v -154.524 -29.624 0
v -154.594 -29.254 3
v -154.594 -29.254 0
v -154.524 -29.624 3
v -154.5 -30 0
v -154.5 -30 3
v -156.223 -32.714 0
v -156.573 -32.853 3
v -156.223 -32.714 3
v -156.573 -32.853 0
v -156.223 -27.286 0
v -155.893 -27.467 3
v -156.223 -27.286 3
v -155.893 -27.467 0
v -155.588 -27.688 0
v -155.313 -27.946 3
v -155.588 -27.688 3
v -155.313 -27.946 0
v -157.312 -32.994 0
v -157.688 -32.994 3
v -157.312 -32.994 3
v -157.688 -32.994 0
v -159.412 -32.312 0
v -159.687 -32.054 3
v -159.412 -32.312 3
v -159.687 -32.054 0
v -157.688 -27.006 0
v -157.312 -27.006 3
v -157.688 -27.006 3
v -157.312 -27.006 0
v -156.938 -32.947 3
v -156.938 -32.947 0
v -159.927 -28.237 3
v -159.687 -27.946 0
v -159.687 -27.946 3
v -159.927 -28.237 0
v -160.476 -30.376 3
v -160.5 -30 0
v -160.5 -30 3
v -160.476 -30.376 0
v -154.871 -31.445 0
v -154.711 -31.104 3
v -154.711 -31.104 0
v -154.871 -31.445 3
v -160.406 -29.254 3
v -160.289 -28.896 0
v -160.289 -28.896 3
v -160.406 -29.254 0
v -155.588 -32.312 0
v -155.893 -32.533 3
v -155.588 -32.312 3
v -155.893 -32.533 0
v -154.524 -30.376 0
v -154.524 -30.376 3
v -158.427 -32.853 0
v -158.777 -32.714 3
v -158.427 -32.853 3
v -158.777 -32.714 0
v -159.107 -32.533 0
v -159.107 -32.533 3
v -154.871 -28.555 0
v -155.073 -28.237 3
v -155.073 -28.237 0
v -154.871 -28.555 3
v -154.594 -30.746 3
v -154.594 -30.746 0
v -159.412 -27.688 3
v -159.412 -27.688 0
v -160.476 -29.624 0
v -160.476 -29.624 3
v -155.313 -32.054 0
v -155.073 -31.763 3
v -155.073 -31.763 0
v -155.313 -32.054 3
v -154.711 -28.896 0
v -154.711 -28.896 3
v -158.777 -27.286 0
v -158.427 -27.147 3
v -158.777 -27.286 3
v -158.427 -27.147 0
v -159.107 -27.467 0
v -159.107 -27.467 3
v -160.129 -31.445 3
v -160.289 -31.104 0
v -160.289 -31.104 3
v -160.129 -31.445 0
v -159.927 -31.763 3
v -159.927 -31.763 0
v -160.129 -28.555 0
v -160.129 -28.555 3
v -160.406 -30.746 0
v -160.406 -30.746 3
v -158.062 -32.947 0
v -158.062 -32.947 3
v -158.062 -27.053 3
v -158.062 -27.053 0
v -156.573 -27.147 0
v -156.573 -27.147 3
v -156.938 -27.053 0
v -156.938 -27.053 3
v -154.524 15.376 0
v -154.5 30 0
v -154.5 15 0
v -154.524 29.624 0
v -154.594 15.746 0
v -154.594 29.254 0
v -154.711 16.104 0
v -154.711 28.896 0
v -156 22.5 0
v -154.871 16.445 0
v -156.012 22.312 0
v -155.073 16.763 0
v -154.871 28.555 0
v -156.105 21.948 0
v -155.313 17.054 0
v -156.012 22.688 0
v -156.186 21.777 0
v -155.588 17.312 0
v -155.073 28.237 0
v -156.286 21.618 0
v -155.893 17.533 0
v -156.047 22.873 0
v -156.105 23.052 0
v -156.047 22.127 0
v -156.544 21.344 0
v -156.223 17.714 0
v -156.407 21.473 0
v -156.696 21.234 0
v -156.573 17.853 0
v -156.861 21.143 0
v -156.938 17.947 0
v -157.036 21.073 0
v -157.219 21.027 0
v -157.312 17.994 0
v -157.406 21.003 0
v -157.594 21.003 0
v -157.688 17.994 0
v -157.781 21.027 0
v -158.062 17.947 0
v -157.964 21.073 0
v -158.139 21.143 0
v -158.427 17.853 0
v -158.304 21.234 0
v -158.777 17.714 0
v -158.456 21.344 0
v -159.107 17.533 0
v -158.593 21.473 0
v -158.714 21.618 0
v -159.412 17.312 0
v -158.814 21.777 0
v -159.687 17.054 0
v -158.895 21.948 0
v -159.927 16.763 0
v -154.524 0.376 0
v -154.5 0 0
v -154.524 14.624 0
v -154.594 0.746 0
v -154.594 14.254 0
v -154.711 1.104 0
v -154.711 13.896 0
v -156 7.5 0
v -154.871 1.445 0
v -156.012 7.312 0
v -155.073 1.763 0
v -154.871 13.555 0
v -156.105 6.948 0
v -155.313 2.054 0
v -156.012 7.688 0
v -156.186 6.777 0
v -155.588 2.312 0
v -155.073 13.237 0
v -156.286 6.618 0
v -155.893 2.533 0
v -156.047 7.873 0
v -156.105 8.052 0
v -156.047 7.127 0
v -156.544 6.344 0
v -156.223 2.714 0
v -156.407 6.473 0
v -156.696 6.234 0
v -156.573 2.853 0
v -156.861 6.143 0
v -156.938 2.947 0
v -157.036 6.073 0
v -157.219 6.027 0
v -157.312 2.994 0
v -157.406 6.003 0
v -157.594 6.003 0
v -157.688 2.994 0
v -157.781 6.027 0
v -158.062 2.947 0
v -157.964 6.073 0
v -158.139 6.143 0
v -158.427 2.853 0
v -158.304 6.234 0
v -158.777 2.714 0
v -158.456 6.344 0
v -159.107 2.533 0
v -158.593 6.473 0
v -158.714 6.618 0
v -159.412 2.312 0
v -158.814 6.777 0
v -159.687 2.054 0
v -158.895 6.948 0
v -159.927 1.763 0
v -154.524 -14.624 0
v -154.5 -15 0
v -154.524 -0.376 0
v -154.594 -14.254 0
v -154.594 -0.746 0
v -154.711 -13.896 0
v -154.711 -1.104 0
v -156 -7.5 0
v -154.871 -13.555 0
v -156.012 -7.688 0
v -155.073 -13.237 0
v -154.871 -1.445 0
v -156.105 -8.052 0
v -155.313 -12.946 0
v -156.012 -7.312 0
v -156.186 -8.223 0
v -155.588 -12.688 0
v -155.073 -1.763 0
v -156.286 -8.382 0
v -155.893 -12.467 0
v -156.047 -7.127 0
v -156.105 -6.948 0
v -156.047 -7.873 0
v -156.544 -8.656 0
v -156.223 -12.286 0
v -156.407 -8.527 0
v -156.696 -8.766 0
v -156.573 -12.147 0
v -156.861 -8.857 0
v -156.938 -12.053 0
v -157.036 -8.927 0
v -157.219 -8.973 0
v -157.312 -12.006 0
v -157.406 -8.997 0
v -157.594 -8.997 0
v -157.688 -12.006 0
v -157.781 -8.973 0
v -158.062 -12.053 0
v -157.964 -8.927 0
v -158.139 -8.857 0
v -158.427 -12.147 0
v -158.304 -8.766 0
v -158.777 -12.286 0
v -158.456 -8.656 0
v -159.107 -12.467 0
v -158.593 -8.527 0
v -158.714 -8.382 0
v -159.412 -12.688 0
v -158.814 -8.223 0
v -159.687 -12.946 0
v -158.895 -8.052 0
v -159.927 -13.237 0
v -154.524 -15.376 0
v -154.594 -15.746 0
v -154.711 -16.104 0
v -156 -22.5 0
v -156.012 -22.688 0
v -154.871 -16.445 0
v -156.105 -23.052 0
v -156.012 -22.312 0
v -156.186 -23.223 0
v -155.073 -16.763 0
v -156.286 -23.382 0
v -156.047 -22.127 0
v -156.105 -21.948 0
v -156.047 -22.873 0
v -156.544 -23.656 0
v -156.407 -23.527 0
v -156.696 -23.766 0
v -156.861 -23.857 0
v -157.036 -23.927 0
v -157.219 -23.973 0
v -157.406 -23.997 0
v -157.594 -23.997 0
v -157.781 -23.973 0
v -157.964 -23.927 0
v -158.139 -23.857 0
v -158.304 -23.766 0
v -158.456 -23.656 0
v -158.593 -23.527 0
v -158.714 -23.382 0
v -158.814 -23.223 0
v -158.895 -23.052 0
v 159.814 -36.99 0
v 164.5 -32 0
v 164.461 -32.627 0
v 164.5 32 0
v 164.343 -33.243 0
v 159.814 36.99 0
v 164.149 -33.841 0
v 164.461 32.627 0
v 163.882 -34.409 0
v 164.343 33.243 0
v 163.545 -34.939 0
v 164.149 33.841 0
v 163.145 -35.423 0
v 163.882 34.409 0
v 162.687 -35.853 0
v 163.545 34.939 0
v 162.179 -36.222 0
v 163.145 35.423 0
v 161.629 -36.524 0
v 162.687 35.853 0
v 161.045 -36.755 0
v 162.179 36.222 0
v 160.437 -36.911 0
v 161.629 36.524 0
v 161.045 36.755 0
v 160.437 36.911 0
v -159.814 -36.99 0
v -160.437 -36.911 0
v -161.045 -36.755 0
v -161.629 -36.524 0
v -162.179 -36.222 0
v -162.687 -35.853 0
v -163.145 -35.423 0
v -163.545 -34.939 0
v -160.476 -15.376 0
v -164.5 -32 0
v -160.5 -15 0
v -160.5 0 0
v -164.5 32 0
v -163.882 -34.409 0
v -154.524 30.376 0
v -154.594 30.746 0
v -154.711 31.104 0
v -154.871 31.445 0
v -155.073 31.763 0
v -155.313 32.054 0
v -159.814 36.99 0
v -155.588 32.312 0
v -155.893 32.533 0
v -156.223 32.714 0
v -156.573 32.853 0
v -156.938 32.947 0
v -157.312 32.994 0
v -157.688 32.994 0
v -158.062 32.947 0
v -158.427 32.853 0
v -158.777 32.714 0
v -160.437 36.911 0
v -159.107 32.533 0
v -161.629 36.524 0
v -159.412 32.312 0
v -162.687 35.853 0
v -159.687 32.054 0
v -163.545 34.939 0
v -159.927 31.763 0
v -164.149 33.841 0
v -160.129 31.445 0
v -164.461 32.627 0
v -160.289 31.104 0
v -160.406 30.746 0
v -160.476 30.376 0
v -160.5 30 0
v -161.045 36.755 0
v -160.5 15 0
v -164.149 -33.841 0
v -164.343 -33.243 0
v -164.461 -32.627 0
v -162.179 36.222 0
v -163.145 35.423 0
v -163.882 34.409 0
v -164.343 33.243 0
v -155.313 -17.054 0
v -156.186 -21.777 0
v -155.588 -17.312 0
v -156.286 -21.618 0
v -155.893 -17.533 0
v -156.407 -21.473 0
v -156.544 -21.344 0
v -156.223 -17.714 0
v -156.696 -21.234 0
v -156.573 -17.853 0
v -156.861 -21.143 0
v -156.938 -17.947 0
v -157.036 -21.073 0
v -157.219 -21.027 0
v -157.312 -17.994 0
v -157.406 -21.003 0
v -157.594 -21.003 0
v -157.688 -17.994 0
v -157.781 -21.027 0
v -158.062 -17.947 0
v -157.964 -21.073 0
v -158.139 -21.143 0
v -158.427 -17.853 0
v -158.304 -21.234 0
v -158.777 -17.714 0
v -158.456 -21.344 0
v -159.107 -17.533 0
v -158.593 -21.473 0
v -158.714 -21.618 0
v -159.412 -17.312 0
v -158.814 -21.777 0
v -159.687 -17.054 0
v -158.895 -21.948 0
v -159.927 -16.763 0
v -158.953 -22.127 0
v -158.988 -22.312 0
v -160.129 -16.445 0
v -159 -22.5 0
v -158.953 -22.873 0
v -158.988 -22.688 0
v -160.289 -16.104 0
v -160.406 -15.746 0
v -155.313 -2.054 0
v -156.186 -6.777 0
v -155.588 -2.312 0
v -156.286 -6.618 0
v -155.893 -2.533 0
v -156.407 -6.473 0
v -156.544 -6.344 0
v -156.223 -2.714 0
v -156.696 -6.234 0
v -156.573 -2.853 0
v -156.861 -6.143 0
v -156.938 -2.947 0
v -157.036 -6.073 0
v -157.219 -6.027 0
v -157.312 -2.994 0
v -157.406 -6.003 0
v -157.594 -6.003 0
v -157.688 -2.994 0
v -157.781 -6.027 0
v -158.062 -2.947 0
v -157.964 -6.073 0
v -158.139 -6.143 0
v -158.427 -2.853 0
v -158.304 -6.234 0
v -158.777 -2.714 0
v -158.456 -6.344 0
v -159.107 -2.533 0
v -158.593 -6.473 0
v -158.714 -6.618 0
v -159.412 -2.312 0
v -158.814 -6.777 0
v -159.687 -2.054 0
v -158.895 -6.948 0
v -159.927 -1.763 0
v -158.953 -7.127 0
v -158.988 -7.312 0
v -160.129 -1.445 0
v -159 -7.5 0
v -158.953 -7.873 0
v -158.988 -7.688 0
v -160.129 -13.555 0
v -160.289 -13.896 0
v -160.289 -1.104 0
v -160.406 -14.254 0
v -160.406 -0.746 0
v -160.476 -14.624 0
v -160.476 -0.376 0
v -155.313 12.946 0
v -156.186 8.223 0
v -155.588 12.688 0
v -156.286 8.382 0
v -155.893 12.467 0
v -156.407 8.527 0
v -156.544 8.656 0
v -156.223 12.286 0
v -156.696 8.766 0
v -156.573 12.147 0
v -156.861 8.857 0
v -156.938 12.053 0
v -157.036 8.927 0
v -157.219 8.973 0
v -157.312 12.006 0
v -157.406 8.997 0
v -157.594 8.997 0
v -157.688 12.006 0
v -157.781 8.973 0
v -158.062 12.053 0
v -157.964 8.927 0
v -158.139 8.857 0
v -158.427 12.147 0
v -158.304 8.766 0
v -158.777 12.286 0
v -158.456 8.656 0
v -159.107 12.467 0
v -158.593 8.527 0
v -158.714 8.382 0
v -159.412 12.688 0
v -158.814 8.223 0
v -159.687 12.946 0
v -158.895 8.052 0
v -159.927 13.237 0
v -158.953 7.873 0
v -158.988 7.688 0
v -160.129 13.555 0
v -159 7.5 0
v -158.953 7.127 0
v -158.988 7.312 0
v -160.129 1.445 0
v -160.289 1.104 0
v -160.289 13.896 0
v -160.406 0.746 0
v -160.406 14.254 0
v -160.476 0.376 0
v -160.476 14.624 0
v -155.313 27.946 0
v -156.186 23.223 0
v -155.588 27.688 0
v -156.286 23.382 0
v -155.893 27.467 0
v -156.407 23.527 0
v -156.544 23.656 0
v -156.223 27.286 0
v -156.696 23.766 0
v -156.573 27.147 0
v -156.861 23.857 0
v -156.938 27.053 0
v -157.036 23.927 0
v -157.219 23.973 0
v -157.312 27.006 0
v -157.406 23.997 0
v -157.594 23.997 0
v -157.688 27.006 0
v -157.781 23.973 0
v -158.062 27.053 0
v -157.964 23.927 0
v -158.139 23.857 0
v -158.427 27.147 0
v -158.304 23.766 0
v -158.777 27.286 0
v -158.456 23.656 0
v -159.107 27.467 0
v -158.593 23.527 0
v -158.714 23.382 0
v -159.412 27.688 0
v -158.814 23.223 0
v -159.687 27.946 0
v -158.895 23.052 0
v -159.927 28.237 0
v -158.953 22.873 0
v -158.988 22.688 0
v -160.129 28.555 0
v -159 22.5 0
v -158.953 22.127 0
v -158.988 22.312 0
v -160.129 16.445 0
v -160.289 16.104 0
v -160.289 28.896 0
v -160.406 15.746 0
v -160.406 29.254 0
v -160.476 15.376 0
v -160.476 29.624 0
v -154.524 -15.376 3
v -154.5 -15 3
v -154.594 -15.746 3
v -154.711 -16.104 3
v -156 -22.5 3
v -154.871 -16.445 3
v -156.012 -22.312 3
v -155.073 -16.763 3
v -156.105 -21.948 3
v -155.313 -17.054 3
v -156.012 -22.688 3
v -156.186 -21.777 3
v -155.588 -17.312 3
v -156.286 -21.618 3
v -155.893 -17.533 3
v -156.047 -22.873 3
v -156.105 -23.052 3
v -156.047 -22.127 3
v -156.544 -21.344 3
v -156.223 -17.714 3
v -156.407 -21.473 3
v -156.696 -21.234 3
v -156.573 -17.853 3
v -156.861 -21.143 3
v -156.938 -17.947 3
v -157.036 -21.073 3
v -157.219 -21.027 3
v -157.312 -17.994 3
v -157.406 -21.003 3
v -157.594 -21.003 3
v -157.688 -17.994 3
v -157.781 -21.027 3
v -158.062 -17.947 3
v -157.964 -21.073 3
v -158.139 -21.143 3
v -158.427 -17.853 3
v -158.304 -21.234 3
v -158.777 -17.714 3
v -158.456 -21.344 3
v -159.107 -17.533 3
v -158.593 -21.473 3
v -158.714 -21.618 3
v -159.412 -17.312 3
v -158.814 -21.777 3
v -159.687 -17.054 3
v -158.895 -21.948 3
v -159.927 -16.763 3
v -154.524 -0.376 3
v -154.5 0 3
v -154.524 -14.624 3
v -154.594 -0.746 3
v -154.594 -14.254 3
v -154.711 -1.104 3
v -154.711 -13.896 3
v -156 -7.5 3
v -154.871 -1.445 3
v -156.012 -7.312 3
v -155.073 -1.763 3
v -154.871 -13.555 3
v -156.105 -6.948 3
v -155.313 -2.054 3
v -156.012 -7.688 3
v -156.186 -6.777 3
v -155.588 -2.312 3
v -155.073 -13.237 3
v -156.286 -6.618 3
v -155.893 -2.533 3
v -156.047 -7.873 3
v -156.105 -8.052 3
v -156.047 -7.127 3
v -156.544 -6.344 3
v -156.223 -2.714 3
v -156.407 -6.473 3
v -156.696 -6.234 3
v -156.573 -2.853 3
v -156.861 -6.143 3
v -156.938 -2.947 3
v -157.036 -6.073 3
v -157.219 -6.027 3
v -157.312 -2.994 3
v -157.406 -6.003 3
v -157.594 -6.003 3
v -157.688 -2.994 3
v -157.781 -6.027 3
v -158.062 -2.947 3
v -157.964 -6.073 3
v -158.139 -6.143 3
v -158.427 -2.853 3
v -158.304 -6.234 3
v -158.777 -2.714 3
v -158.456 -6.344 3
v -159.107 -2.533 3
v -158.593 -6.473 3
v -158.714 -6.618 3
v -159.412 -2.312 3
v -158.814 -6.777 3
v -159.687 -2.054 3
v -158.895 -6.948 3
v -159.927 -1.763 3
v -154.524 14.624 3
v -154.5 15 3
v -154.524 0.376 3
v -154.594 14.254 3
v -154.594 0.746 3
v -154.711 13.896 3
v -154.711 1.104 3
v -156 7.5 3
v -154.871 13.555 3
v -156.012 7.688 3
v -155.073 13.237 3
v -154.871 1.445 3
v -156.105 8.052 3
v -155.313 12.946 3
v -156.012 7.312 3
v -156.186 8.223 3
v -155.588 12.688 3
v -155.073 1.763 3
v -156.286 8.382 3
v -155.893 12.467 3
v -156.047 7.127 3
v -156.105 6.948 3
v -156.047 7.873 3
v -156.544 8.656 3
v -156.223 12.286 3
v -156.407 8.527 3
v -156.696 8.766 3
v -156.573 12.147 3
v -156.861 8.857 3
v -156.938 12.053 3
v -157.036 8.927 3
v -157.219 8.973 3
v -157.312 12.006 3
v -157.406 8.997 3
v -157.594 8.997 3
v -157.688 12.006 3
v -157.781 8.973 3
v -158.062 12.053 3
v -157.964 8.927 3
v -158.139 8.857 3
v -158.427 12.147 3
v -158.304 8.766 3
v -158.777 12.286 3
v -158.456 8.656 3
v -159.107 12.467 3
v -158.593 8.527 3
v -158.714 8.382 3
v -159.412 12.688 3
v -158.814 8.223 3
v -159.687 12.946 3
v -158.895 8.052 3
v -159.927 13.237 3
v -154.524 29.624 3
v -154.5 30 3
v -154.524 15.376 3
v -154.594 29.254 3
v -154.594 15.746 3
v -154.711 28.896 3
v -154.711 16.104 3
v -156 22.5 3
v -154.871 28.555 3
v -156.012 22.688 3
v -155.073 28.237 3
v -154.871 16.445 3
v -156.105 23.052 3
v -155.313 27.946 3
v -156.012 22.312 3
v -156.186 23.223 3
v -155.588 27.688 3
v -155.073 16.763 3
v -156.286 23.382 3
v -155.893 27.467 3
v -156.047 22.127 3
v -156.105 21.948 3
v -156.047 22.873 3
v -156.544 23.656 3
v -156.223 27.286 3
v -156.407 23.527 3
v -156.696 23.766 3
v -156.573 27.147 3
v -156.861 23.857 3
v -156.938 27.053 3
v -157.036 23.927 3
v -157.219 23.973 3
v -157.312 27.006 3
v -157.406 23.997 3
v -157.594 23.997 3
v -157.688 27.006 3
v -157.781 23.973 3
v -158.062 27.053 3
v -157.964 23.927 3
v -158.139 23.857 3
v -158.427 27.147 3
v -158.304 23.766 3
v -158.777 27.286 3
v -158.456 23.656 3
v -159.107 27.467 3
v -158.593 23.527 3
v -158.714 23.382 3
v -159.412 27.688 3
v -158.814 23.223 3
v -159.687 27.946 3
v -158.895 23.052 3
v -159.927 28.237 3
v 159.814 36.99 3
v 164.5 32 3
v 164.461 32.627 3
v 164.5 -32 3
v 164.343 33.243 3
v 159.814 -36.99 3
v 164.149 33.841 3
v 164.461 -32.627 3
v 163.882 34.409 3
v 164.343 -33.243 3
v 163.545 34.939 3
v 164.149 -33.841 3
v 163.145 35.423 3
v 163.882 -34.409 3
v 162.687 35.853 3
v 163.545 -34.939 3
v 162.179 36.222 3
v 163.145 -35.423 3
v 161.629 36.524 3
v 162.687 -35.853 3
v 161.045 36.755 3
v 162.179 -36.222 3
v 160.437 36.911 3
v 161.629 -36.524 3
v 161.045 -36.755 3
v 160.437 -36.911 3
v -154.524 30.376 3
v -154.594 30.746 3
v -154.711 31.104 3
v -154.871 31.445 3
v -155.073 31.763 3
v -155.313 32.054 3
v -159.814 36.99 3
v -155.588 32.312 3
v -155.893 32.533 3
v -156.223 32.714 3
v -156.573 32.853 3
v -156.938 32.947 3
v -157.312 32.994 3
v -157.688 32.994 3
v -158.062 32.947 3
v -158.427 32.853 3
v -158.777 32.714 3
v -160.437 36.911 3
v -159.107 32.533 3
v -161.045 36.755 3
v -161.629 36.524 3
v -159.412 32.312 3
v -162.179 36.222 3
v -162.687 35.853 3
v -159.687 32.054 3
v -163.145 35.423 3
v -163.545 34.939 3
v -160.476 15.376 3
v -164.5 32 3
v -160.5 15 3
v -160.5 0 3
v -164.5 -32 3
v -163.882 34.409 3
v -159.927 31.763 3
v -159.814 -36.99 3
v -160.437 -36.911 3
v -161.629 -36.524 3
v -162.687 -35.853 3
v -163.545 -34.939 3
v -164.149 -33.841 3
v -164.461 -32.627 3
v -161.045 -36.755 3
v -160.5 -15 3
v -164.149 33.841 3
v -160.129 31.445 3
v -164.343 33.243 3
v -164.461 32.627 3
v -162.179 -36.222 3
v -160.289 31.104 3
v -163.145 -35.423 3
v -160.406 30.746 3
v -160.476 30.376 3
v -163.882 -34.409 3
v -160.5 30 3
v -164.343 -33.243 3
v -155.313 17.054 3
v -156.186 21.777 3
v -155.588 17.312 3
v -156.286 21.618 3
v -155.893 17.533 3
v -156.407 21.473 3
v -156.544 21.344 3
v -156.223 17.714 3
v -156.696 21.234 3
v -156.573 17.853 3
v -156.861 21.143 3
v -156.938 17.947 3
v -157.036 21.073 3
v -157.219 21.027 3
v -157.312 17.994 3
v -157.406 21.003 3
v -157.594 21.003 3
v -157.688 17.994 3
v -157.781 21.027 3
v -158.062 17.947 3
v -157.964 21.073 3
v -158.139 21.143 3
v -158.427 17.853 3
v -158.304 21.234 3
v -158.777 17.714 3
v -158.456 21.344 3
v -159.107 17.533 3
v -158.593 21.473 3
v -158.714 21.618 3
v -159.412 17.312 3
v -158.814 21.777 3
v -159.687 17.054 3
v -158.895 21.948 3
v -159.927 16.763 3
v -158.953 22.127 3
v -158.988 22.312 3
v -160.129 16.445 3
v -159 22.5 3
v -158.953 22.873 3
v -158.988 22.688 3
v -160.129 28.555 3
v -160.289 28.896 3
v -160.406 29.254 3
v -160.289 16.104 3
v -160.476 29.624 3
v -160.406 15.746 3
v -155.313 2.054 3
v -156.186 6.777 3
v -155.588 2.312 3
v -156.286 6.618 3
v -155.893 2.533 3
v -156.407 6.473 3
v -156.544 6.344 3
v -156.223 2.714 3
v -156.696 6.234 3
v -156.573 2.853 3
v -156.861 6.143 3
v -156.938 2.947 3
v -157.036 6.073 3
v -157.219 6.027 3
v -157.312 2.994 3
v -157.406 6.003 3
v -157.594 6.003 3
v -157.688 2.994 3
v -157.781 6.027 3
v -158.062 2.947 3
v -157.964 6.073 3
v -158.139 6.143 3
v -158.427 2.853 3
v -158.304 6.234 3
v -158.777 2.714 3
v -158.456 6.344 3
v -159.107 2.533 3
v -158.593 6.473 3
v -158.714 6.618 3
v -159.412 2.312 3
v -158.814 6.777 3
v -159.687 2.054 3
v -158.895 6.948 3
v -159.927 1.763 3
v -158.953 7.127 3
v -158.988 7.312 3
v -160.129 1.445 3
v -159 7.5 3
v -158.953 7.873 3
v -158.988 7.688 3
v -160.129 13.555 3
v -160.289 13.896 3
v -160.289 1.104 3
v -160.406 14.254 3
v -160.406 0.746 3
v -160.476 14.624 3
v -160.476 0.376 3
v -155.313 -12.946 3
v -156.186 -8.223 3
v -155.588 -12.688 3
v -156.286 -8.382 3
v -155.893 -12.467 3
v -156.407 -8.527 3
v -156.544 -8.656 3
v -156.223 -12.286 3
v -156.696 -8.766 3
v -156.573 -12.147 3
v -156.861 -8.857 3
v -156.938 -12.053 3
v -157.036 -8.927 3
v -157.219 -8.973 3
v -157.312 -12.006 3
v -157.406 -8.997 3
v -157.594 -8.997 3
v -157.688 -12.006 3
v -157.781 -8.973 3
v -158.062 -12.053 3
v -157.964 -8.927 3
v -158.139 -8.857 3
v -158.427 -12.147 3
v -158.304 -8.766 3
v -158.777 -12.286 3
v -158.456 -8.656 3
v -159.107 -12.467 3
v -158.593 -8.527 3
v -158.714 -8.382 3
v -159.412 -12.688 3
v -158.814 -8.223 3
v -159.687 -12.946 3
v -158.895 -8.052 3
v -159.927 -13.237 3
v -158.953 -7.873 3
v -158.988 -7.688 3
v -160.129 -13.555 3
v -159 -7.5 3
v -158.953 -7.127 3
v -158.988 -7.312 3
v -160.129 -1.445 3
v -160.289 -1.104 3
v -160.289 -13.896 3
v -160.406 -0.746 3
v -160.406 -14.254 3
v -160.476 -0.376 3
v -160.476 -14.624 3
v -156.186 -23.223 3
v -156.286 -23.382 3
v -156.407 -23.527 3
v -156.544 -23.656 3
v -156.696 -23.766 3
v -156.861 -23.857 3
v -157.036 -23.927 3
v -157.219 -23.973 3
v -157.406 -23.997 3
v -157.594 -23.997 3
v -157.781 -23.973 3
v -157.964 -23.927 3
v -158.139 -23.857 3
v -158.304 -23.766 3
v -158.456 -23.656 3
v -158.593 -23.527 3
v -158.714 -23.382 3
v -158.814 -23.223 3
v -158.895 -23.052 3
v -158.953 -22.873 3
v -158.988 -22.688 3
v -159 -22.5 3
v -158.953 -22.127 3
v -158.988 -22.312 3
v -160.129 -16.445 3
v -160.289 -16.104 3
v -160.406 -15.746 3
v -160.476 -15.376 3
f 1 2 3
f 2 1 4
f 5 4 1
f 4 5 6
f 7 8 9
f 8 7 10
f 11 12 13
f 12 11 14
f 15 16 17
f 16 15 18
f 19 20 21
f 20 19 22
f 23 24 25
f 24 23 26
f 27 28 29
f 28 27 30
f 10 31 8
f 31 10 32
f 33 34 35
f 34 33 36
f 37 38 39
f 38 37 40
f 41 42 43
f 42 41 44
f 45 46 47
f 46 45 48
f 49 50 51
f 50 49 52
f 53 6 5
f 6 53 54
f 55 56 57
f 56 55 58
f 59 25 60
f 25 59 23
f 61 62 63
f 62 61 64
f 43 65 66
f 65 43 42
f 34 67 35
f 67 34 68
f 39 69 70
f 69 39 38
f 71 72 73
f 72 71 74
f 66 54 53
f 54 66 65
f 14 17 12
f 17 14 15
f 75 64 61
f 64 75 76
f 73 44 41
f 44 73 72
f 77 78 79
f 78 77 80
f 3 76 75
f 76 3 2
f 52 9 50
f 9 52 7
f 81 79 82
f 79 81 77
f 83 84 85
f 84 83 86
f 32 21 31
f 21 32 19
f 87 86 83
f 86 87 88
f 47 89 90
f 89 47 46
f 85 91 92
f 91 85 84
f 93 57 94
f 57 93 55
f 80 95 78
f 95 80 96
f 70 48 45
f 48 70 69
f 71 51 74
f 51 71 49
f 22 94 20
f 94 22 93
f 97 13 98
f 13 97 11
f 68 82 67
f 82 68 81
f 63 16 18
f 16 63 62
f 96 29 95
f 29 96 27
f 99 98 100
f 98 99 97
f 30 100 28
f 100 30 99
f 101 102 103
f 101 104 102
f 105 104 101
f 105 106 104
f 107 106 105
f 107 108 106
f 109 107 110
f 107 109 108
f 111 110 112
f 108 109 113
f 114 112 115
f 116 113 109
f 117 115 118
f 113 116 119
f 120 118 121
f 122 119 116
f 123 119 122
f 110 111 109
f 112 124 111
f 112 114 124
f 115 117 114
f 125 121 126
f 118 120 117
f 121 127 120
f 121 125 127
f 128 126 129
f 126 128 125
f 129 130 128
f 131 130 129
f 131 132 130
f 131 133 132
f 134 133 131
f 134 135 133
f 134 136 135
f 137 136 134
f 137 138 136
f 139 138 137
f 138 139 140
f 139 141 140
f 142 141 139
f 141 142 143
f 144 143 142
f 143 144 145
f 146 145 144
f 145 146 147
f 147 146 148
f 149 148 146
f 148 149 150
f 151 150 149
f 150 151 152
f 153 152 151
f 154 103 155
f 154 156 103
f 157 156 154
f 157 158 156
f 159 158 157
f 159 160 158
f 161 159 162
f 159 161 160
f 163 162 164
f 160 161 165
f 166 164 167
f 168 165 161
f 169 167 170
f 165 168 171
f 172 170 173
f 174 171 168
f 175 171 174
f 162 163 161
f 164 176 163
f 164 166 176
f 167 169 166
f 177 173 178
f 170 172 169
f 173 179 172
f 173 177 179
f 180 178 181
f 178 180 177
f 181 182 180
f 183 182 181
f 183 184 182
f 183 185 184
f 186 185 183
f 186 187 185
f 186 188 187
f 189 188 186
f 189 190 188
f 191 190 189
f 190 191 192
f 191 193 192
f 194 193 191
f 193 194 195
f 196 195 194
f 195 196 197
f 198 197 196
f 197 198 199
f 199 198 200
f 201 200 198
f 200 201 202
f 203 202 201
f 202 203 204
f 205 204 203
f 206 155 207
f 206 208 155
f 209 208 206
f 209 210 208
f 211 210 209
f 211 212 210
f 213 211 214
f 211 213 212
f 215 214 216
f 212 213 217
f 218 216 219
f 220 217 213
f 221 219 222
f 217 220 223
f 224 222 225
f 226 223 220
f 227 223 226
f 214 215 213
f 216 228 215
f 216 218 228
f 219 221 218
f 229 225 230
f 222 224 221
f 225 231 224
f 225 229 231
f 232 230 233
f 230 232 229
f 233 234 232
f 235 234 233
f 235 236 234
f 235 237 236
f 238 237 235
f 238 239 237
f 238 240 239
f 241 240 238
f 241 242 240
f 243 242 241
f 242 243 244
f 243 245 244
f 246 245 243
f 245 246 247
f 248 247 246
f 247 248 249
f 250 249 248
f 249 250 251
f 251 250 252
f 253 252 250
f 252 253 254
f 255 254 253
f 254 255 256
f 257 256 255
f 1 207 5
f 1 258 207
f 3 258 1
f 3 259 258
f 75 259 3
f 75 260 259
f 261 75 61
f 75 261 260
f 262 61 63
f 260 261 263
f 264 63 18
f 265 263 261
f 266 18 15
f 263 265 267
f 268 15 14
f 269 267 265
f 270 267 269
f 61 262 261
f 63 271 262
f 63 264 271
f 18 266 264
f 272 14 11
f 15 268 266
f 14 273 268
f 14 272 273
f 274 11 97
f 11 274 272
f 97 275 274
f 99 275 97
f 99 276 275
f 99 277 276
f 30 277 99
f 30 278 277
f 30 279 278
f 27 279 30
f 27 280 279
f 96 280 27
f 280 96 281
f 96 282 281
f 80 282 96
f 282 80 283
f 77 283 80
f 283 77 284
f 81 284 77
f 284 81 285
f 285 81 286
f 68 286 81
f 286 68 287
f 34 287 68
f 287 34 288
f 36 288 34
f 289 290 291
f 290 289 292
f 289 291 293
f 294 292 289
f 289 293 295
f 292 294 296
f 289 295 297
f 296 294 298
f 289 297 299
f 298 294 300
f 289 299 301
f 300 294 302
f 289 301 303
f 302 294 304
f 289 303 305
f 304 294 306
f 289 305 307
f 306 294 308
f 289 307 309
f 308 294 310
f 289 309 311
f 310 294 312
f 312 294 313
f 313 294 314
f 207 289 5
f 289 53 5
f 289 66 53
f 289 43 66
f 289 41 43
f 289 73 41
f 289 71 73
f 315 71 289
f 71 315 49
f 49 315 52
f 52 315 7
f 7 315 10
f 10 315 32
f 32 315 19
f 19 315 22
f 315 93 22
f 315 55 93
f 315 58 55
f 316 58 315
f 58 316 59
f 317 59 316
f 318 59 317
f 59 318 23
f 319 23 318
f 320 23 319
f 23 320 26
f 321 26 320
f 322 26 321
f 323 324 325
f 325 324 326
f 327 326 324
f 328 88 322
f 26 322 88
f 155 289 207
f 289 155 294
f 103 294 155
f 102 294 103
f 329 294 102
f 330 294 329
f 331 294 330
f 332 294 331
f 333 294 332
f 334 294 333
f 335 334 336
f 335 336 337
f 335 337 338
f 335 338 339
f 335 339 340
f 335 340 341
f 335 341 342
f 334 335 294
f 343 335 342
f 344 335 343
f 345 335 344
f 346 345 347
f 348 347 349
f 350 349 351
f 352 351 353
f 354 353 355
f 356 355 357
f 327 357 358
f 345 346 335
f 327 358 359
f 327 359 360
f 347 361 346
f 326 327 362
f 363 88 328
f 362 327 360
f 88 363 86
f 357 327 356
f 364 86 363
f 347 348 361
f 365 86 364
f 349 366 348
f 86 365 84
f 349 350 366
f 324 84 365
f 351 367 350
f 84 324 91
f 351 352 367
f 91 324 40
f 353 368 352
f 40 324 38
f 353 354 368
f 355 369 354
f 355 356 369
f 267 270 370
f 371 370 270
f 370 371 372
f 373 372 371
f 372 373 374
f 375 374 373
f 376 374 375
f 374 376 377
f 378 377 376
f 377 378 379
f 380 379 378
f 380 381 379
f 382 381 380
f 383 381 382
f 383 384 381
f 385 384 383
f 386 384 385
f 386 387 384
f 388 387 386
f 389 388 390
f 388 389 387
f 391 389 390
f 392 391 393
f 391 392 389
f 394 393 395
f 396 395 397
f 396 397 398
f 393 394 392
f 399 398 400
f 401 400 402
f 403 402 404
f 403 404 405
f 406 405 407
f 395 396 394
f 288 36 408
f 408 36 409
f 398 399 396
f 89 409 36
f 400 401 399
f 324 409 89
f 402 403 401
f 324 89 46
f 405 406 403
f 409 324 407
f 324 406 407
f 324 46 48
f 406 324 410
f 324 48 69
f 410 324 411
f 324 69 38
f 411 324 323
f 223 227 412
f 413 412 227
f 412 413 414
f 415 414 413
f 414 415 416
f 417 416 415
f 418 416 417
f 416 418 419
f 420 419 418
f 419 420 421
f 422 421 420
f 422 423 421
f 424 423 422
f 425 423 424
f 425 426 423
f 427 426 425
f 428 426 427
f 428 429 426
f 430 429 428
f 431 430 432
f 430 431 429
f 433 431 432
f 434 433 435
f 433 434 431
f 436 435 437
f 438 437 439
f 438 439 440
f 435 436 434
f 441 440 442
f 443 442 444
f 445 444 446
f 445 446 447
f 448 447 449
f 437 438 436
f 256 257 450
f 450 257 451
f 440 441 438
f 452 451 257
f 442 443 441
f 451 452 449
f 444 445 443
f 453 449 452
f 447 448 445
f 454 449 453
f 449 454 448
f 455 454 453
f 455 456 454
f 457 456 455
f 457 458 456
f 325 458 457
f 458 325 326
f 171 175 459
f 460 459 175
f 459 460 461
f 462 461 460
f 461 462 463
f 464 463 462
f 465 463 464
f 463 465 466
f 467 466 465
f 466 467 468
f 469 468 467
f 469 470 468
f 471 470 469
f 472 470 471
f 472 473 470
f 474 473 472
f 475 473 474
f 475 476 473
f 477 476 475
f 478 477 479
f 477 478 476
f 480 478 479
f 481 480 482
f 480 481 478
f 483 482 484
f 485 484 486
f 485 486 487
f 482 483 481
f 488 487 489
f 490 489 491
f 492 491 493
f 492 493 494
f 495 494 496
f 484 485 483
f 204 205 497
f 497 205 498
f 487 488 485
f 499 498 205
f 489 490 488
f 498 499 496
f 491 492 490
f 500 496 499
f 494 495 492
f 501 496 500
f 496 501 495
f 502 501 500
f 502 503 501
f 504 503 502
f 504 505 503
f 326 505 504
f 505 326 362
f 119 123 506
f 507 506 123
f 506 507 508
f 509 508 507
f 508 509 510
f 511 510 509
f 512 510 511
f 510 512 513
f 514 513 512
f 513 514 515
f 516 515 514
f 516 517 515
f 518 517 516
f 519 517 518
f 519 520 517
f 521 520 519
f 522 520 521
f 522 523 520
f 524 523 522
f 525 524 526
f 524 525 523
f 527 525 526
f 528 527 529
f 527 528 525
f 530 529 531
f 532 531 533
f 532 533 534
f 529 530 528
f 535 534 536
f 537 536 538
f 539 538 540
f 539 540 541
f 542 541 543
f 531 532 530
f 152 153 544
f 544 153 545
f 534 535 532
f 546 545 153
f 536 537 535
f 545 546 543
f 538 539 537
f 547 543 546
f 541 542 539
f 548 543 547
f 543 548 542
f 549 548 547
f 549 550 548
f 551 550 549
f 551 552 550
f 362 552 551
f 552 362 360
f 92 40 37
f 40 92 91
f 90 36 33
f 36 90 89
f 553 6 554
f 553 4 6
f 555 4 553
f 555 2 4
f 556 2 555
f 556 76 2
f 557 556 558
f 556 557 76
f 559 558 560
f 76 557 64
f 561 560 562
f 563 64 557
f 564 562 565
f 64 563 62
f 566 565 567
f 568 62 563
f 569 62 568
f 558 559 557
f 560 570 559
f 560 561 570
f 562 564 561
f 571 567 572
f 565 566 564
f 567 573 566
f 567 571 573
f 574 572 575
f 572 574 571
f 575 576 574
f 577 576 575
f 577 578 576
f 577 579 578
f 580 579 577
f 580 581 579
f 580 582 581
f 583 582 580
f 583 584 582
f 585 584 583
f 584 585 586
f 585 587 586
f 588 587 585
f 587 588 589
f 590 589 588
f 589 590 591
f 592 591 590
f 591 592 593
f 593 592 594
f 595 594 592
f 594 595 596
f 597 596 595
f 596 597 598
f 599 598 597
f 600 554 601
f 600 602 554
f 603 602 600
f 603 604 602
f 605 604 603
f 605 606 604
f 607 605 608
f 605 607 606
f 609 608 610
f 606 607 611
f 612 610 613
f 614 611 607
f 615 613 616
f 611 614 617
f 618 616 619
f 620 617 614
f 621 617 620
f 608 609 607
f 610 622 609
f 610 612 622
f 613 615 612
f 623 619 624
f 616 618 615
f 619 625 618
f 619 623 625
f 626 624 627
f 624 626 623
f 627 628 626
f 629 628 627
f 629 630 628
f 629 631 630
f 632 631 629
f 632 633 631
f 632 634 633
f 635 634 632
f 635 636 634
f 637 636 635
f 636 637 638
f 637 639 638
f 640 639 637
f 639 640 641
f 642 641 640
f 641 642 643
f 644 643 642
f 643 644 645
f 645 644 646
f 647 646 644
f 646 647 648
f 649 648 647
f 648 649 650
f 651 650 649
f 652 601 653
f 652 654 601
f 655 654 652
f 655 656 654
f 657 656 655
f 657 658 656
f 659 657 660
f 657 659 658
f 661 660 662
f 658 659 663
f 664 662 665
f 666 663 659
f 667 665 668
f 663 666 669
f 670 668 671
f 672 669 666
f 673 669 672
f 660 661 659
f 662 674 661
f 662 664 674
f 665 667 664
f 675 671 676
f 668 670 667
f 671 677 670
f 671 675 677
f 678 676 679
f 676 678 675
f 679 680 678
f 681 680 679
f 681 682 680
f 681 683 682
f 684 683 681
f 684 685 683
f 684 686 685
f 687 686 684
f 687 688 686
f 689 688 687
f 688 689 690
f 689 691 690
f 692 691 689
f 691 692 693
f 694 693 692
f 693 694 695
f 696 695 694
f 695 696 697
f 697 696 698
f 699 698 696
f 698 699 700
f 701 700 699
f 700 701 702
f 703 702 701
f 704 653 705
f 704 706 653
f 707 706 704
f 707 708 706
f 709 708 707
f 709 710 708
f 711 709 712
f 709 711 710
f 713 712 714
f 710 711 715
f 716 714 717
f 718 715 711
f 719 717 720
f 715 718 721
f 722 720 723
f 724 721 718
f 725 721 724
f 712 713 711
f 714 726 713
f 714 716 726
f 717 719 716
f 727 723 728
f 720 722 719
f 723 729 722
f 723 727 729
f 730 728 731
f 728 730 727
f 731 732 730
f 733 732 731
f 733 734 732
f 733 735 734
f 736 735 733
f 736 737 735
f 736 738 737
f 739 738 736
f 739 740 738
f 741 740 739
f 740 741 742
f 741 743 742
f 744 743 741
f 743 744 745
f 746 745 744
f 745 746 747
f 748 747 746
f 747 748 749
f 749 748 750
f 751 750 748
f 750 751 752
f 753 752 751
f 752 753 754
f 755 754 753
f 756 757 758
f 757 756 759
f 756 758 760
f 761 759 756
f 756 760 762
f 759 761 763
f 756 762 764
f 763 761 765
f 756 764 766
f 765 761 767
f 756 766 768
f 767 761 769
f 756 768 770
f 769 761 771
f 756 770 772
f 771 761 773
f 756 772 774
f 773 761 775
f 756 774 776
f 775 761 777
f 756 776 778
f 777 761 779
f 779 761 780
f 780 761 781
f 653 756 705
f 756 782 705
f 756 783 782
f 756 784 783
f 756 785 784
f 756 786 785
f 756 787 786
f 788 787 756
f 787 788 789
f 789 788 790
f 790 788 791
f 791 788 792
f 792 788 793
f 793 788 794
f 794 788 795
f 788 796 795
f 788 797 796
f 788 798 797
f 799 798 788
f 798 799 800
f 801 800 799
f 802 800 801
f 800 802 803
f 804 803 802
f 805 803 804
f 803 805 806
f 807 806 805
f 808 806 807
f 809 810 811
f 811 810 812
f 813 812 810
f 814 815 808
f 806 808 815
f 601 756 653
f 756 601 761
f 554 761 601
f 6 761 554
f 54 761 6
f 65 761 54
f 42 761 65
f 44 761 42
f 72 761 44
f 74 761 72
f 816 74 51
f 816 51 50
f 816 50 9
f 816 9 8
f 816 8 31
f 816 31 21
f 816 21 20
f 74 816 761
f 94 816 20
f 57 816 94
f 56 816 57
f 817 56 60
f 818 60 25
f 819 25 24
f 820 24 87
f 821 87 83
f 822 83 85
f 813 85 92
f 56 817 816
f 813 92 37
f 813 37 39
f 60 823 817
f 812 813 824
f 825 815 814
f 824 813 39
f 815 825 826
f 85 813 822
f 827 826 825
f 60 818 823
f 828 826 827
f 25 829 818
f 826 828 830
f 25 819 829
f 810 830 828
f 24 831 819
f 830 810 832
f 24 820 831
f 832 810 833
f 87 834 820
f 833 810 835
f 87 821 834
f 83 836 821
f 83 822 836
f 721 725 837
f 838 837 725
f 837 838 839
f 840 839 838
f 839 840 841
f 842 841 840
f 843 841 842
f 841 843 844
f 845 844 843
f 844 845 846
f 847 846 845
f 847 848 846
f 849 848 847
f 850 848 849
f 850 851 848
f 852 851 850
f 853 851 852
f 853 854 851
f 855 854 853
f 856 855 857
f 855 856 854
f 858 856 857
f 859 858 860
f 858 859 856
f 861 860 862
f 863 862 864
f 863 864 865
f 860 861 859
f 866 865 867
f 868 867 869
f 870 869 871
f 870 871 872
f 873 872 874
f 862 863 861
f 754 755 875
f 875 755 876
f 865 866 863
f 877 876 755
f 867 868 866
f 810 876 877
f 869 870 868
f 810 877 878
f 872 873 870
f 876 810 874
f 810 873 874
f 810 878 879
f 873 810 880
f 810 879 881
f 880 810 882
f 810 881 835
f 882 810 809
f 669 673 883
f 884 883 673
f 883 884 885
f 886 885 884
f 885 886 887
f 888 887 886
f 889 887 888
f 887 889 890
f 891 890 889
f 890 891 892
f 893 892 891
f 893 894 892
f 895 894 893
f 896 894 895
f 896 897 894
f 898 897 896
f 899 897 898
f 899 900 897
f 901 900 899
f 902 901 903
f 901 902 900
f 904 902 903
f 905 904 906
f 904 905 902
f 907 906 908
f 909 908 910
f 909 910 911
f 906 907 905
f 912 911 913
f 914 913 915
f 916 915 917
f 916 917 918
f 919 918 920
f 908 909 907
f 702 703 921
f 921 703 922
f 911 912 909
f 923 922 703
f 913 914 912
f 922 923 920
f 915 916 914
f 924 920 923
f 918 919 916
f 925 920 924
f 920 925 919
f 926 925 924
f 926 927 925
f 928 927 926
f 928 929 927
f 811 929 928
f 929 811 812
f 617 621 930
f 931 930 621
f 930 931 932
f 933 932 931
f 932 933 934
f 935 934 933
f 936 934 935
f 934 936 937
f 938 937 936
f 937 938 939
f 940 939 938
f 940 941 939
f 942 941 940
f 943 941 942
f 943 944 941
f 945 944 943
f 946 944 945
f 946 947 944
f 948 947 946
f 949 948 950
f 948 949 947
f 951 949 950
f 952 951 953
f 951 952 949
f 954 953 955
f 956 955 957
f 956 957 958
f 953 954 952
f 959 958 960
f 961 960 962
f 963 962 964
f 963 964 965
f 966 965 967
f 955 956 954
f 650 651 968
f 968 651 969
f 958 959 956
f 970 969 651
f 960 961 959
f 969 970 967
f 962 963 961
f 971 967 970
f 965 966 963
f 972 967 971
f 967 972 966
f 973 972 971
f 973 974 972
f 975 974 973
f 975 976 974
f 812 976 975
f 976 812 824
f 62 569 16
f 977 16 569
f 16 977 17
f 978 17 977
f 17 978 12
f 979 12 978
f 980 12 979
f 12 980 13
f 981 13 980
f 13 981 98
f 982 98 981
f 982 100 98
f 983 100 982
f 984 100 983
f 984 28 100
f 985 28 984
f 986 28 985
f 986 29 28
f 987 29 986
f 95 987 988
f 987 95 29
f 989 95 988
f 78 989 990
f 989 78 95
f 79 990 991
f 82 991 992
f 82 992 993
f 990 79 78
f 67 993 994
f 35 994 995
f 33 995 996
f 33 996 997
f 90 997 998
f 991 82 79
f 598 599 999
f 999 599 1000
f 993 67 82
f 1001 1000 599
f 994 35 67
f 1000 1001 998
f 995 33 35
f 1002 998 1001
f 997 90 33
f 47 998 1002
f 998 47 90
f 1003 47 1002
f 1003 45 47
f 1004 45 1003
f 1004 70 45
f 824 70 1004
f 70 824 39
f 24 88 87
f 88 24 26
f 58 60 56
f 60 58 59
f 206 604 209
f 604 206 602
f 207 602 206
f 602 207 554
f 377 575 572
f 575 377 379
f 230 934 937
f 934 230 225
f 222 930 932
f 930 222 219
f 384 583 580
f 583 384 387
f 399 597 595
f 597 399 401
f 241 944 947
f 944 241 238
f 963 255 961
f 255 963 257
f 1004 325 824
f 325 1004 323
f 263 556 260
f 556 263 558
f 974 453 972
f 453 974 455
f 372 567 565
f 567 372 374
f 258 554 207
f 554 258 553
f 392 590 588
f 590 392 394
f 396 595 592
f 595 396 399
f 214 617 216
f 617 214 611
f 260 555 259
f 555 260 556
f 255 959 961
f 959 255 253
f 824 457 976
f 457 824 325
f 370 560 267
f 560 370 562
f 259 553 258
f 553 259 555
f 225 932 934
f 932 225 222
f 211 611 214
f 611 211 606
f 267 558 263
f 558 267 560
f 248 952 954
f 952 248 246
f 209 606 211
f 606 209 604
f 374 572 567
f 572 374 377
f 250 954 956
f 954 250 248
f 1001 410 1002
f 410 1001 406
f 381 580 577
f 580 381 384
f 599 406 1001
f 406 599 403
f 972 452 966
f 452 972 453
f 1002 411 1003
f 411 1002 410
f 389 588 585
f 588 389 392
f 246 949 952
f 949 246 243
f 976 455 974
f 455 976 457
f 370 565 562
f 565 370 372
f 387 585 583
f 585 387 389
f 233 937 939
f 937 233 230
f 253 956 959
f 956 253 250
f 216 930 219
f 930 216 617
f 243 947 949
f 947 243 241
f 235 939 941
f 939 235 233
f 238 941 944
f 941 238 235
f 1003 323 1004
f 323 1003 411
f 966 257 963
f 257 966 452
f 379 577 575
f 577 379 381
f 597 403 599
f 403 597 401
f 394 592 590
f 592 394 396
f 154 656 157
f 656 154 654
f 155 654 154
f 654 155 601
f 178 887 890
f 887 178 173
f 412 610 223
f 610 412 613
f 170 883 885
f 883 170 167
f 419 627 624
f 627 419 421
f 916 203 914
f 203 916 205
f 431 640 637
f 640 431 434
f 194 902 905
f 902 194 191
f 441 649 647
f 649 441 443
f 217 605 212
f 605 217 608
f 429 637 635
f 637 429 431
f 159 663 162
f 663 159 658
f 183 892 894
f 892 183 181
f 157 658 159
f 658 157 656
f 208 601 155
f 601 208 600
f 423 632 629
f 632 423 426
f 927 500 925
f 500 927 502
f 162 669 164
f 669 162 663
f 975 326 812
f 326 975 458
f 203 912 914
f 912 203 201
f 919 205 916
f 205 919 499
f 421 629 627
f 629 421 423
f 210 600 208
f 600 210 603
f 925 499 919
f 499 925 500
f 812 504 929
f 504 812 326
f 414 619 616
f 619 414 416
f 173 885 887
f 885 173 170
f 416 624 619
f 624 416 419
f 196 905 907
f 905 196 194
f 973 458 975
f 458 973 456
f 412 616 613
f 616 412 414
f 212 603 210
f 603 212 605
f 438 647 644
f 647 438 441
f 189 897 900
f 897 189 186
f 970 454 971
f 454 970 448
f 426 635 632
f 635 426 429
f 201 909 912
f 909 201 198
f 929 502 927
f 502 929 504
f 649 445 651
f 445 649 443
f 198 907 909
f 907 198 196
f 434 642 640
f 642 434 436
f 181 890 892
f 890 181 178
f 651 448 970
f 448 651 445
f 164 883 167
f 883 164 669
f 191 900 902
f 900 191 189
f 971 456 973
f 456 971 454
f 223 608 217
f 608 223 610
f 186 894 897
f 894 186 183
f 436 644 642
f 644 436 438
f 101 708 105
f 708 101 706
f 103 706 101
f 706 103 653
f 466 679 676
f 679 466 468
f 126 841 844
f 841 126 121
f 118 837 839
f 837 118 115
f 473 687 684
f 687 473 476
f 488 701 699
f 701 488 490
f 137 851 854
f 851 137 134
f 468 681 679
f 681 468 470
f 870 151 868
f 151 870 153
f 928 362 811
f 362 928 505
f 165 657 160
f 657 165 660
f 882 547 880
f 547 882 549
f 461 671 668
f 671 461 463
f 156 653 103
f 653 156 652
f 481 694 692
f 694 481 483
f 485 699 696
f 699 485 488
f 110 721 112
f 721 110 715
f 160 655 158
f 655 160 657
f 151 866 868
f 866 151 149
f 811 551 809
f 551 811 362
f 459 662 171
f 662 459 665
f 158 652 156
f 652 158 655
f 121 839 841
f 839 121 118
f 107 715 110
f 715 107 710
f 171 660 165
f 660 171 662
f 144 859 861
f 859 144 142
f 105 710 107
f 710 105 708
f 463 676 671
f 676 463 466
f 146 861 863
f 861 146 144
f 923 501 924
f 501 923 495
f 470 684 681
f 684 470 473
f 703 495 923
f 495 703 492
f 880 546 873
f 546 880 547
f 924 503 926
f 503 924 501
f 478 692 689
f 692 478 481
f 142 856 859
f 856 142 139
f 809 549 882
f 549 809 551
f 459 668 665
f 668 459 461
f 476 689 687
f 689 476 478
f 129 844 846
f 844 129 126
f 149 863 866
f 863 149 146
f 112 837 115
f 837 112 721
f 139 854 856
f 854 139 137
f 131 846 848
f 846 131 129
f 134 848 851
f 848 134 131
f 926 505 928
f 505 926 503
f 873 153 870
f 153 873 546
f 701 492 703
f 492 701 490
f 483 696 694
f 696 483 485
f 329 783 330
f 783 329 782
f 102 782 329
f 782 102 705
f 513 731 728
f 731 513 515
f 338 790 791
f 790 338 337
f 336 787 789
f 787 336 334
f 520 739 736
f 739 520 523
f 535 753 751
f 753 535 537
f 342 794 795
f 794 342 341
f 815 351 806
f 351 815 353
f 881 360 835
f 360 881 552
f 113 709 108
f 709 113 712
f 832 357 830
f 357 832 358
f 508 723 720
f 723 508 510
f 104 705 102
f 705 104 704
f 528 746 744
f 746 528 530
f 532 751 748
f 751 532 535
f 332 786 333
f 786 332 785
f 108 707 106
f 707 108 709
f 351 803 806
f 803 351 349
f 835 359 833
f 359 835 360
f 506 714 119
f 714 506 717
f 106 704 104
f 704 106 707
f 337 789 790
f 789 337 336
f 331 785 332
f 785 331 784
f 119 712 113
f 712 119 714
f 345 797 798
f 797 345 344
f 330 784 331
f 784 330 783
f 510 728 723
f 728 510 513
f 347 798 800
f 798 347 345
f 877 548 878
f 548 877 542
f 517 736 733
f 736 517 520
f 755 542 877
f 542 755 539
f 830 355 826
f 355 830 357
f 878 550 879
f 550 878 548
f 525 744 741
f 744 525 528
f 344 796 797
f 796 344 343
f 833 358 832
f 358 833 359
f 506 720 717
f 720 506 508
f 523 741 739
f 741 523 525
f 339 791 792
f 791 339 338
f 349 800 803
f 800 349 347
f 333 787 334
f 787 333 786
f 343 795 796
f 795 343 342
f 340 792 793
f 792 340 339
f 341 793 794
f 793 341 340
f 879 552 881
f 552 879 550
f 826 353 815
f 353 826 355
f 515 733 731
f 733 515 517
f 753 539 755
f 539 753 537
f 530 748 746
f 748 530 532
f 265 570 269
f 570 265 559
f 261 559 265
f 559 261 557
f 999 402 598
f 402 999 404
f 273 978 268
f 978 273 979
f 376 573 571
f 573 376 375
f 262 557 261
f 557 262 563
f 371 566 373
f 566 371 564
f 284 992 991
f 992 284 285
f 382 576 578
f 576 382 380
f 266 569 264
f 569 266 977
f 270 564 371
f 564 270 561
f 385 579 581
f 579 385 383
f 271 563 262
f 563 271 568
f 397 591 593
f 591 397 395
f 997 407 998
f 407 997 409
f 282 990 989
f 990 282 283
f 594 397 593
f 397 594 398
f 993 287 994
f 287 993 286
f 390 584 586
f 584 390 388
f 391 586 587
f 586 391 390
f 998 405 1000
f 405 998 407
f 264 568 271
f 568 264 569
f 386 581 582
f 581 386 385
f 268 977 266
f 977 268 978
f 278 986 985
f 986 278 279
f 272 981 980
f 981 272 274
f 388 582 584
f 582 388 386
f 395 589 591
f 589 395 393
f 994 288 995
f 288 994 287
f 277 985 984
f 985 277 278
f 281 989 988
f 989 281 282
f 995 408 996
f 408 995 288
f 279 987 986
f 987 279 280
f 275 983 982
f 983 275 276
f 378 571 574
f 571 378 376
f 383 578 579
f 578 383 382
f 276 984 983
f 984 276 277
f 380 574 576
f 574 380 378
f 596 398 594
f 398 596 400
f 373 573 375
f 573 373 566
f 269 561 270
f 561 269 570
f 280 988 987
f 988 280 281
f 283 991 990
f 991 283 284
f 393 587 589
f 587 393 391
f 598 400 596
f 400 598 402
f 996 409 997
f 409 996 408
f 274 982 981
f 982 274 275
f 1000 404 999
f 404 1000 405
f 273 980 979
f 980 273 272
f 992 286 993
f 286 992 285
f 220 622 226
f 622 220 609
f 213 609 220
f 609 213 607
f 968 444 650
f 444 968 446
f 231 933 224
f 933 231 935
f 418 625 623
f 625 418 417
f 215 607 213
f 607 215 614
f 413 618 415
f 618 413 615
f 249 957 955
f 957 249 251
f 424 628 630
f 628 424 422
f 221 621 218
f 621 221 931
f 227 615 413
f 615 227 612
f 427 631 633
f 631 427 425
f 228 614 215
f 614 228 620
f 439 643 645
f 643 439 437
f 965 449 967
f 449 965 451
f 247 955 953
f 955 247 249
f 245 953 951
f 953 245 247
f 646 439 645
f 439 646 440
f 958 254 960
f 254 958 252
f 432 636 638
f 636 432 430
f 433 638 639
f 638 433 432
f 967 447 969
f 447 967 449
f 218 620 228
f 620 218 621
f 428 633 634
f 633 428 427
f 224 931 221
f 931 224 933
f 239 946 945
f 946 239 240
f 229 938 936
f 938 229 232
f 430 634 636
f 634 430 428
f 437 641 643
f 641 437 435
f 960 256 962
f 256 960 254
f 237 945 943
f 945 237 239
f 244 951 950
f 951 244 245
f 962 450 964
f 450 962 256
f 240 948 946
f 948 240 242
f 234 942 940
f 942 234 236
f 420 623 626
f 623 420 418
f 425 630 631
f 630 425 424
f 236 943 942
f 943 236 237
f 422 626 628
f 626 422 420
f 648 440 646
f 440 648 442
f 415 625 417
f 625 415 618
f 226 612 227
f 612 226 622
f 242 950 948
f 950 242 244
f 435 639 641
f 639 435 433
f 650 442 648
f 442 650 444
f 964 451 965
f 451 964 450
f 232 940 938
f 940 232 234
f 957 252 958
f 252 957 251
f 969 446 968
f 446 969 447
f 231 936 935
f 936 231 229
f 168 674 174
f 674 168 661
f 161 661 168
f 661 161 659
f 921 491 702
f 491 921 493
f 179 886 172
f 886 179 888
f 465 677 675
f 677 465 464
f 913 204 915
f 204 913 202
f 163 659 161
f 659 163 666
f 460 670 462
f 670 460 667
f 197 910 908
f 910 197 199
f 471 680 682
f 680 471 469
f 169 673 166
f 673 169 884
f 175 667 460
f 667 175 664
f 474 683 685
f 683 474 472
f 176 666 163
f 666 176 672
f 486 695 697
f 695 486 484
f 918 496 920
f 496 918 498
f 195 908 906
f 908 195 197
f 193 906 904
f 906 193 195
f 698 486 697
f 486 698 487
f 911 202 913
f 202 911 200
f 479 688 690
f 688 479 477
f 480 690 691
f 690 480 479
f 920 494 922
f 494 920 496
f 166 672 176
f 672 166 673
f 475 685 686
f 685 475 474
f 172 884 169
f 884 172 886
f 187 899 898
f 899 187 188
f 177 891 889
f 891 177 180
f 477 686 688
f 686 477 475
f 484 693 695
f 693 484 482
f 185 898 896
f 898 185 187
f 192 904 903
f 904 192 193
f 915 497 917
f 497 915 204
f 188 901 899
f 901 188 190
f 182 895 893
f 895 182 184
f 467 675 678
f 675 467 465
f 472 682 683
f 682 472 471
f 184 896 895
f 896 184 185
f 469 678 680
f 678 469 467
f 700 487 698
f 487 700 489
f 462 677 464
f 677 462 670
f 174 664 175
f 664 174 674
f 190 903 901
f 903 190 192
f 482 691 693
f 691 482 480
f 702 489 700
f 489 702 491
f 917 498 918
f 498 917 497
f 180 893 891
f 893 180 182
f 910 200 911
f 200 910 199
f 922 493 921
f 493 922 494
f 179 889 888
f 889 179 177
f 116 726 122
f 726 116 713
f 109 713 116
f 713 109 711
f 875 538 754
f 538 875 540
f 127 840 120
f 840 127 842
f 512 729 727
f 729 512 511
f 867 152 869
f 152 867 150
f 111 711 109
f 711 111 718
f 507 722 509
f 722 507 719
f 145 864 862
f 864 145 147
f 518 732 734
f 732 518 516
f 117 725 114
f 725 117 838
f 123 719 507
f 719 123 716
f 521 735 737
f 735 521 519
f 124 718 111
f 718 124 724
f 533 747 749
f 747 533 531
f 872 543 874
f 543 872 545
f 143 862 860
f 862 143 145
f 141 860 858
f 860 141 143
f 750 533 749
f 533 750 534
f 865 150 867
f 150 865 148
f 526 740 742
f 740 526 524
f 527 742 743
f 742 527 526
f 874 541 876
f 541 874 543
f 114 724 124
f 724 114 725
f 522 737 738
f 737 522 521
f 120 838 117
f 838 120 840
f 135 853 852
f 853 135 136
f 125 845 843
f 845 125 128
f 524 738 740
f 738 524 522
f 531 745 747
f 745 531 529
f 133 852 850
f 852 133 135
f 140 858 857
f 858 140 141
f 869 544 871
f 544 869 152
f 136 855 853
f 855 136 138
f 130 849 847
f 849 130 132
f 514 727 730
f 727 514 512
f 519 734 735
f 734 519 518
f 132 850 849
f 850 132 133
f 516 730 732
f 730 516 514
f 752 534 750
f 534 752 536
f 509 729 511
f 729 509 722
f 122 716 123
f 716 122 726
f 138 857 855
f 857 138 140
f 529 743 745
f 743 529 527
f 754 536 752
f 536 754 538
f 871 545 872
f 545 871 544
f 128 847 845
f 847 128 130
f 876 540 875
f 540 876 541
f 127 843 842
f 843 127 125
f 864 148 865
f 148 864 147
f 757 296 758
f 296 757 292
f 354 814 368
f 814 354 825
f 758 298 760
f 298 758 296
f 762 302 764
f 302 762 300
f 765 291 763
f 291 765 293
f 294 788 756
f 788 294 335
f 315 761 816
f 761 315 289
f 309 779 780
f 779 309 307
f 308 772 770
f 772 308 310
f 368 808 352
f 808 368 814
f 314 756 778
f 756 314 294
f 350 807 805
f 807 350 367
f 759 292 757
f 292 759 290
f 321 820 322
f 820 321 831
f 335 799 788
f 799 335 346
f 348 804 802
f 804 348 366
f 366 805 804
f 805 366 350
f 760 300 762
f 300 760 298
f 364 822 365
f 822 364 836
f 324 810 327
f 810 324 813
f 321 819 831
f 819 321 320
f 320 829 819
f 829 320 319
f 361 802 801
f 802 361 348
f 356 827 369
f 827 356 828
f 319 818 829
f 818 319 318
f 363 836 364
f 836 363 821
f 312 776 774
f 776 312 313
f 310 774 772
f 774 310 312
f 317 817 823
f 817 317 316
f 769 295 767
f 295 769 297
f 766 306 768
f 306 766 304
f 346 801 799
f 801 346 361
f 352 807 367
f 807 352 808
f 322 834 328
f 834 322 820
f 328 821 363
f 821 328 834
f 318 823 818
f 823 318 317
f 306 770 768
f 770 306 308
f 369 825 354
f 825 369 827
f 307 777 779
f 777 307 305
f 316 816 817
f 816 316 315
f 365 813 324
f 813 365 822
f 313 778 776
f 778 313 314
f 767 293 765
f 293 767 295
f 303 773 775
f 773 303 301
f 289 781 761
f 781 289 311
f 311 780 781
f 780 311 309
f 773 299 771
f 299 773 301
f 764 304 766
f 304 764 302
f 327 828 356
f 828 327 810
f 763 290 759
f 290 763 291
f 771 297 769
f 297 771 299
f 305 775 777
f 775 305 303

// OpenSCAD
$fn = 50;


difference() {
	union() {
		hull() {
			translate(v = [-159.5000000000, 32.0000000000, 0]) {
				cylinder(h = 3, r = 5);
			}
			translate(v = [159.5000000000, 32.0000000000, 0]) {
				cylinder(h = 3, r = 5);
			}
			translate(v = [-159.5000000000, -32.0000000000, 0]) {
				cylinder(h = 3, r = 5);
			}
			translate(v = [159.5000000000, -32.0000000000, 0]) {
				cylinder(h = 3, r = 5);
			}
		}
	}
	union() {
		translate(v = [-157.5000000000, -30.0000000000, 0]) {
			cylinder(h = 3, r = 3.0000000000);
		}
		translate(v = [-157.5000000000, -15.0000000000, 0]) {
			cylinder(h = 3, r = 3.0000000000);
		}
		translate(v = [-157.5000000000, 0.0000000000, 0]) {
			cylinder(h = 3, r = 3.0000000000);
		}
		translate(v = [-157.5000000000, 15.0000000000, 0]) {
			cylinder(h = 3, r = 3.0000000000);
		}
		translate(v = [-157.5000000000, 30.0000000000, 0]) {
			cylinder(h = 3, r = 3.0000000000);
		}
		translate(v = [-157.5000000000, -30.0000000000, 0]) {
			cylinder(h = 3, r = 1.5000000000);
		}
		translate(v = [-157.5000000000, -22.5000000000, 0]) {
			cylinder(h = 3, r = 1.5000000000);
		}
		translate(v = [-157.5000000000, -15.0000000000, 0]) {
			cylinder(h = 3, r = 1.5000000000);
		}
		translate(v = [-157.5000000000, -7.5000000000, 0]) {
			cylinder(h = 3, r = 1.5000000000);
		}
		translate(v = [-157.5000000000, 0.0000000000, 0]) {
			cylinder(h = 3, r = 1.5000000000);
		}
		translate(v = [-157.5000000000, 7.5000000000, 0]) {
			cylinder(h = 3, r = 1.5000000000);
		}
		translate(v = [-157.5000000000, 15.0000000000, 0]) {
			cylinder(h = 3, r = 1.5000000000);
		}
		translate(v = [-157.5000000000, 22.5000000000, 0]) {
			cylinder(h = 3, r = 1.5000000000);
		}
		translate(v = [-157.5000000000, 30.0000000000, 0]) {
			cylinder(h = 3, r = 1.5000000000);
		}
		translate(v = [-157.5000000000, -30.0000000000, 0]) {
			cylinder(h = 3, r = 1.5000000000);
		}
		translate(v = [-157.5000000000, -22.5000000000, 0]) {
			cylinder(h = 3, r = 1.5000000000);
		}
		translate(v = [-157.5000000000, -15.0000000000, 0]) {
			cylinder(h = 3, r = 1.5000000000);
		}
		translate(v = [-157.5000000000, -7.5000000000, 0]) {
			cylinder(h = 3, r = 1.5000000000);
		}
		translate(v = [-157.5000000000, 0.0000000000, 0]) {
			cylinder(h = 3, r = 1.5000000000);
		}
		translate(v = [-157.5000000000, 7.5000000000, 0]) {
			cylinder(h = 3, r = 1.5000000000);
		}
		translate(v = [-157.5000000000, 15.0000000000, 0]) {
			cylinder(h = 3, r = 1.5000000000);
		}
		translate(v = [-157.5000000000, 22.5000000000, 0]) {
			cylinder(h = 3, r = 1.5000000000);
		}
		translate(v = [-157.5000000000, 30.0000000000, 0]) {
			cylinder(h = 3, r = 1.5000000000);
		}
		translate(v = [-157.5000000000, -30.0000000000, 0]) {
			cylinder(h = 3, r = 1.5000000000);
		}
		translate(v = [-157.5000000000, -22.5000000000, 0]) {
			cylinder(h = 3, r = 1.5000000000);
		}
		translate(v = [-157.5000000000, -15.0000000000, 0]) {
			cylinder(h = 3, r = 1.5000000000);
		}
		translate(v = [-157.5000000000, -7.5000000000, 0]) {
			cylinder(h = 3, r = 1.5000000000);
		}
		translate(v = [-157.5000000000, 0.0000000000, 0]) {
			cylinder(h = 3, r = 1.5000000000);
		}
		translate(v = [-157.5000000000, 7.5000000000, 0]) {
			cylinder(h = 3, r = 1.5000000000);
		}
		translate(v = [-157.5000000000, 15.0000000000, 0]) {
			cylinder(h = 3, r = 1.5000000000);
		}
		translate(v = [-157.5000000000, 22.5000000000, 0]) {
			cylinder(h = 3, r = 1.5000000000);
		}
		translate(v = [-157.5000000000, 30.0000000000, 0]) {
			cylinder(h = 3, r = 1.5000000000);
		}
	}
}
